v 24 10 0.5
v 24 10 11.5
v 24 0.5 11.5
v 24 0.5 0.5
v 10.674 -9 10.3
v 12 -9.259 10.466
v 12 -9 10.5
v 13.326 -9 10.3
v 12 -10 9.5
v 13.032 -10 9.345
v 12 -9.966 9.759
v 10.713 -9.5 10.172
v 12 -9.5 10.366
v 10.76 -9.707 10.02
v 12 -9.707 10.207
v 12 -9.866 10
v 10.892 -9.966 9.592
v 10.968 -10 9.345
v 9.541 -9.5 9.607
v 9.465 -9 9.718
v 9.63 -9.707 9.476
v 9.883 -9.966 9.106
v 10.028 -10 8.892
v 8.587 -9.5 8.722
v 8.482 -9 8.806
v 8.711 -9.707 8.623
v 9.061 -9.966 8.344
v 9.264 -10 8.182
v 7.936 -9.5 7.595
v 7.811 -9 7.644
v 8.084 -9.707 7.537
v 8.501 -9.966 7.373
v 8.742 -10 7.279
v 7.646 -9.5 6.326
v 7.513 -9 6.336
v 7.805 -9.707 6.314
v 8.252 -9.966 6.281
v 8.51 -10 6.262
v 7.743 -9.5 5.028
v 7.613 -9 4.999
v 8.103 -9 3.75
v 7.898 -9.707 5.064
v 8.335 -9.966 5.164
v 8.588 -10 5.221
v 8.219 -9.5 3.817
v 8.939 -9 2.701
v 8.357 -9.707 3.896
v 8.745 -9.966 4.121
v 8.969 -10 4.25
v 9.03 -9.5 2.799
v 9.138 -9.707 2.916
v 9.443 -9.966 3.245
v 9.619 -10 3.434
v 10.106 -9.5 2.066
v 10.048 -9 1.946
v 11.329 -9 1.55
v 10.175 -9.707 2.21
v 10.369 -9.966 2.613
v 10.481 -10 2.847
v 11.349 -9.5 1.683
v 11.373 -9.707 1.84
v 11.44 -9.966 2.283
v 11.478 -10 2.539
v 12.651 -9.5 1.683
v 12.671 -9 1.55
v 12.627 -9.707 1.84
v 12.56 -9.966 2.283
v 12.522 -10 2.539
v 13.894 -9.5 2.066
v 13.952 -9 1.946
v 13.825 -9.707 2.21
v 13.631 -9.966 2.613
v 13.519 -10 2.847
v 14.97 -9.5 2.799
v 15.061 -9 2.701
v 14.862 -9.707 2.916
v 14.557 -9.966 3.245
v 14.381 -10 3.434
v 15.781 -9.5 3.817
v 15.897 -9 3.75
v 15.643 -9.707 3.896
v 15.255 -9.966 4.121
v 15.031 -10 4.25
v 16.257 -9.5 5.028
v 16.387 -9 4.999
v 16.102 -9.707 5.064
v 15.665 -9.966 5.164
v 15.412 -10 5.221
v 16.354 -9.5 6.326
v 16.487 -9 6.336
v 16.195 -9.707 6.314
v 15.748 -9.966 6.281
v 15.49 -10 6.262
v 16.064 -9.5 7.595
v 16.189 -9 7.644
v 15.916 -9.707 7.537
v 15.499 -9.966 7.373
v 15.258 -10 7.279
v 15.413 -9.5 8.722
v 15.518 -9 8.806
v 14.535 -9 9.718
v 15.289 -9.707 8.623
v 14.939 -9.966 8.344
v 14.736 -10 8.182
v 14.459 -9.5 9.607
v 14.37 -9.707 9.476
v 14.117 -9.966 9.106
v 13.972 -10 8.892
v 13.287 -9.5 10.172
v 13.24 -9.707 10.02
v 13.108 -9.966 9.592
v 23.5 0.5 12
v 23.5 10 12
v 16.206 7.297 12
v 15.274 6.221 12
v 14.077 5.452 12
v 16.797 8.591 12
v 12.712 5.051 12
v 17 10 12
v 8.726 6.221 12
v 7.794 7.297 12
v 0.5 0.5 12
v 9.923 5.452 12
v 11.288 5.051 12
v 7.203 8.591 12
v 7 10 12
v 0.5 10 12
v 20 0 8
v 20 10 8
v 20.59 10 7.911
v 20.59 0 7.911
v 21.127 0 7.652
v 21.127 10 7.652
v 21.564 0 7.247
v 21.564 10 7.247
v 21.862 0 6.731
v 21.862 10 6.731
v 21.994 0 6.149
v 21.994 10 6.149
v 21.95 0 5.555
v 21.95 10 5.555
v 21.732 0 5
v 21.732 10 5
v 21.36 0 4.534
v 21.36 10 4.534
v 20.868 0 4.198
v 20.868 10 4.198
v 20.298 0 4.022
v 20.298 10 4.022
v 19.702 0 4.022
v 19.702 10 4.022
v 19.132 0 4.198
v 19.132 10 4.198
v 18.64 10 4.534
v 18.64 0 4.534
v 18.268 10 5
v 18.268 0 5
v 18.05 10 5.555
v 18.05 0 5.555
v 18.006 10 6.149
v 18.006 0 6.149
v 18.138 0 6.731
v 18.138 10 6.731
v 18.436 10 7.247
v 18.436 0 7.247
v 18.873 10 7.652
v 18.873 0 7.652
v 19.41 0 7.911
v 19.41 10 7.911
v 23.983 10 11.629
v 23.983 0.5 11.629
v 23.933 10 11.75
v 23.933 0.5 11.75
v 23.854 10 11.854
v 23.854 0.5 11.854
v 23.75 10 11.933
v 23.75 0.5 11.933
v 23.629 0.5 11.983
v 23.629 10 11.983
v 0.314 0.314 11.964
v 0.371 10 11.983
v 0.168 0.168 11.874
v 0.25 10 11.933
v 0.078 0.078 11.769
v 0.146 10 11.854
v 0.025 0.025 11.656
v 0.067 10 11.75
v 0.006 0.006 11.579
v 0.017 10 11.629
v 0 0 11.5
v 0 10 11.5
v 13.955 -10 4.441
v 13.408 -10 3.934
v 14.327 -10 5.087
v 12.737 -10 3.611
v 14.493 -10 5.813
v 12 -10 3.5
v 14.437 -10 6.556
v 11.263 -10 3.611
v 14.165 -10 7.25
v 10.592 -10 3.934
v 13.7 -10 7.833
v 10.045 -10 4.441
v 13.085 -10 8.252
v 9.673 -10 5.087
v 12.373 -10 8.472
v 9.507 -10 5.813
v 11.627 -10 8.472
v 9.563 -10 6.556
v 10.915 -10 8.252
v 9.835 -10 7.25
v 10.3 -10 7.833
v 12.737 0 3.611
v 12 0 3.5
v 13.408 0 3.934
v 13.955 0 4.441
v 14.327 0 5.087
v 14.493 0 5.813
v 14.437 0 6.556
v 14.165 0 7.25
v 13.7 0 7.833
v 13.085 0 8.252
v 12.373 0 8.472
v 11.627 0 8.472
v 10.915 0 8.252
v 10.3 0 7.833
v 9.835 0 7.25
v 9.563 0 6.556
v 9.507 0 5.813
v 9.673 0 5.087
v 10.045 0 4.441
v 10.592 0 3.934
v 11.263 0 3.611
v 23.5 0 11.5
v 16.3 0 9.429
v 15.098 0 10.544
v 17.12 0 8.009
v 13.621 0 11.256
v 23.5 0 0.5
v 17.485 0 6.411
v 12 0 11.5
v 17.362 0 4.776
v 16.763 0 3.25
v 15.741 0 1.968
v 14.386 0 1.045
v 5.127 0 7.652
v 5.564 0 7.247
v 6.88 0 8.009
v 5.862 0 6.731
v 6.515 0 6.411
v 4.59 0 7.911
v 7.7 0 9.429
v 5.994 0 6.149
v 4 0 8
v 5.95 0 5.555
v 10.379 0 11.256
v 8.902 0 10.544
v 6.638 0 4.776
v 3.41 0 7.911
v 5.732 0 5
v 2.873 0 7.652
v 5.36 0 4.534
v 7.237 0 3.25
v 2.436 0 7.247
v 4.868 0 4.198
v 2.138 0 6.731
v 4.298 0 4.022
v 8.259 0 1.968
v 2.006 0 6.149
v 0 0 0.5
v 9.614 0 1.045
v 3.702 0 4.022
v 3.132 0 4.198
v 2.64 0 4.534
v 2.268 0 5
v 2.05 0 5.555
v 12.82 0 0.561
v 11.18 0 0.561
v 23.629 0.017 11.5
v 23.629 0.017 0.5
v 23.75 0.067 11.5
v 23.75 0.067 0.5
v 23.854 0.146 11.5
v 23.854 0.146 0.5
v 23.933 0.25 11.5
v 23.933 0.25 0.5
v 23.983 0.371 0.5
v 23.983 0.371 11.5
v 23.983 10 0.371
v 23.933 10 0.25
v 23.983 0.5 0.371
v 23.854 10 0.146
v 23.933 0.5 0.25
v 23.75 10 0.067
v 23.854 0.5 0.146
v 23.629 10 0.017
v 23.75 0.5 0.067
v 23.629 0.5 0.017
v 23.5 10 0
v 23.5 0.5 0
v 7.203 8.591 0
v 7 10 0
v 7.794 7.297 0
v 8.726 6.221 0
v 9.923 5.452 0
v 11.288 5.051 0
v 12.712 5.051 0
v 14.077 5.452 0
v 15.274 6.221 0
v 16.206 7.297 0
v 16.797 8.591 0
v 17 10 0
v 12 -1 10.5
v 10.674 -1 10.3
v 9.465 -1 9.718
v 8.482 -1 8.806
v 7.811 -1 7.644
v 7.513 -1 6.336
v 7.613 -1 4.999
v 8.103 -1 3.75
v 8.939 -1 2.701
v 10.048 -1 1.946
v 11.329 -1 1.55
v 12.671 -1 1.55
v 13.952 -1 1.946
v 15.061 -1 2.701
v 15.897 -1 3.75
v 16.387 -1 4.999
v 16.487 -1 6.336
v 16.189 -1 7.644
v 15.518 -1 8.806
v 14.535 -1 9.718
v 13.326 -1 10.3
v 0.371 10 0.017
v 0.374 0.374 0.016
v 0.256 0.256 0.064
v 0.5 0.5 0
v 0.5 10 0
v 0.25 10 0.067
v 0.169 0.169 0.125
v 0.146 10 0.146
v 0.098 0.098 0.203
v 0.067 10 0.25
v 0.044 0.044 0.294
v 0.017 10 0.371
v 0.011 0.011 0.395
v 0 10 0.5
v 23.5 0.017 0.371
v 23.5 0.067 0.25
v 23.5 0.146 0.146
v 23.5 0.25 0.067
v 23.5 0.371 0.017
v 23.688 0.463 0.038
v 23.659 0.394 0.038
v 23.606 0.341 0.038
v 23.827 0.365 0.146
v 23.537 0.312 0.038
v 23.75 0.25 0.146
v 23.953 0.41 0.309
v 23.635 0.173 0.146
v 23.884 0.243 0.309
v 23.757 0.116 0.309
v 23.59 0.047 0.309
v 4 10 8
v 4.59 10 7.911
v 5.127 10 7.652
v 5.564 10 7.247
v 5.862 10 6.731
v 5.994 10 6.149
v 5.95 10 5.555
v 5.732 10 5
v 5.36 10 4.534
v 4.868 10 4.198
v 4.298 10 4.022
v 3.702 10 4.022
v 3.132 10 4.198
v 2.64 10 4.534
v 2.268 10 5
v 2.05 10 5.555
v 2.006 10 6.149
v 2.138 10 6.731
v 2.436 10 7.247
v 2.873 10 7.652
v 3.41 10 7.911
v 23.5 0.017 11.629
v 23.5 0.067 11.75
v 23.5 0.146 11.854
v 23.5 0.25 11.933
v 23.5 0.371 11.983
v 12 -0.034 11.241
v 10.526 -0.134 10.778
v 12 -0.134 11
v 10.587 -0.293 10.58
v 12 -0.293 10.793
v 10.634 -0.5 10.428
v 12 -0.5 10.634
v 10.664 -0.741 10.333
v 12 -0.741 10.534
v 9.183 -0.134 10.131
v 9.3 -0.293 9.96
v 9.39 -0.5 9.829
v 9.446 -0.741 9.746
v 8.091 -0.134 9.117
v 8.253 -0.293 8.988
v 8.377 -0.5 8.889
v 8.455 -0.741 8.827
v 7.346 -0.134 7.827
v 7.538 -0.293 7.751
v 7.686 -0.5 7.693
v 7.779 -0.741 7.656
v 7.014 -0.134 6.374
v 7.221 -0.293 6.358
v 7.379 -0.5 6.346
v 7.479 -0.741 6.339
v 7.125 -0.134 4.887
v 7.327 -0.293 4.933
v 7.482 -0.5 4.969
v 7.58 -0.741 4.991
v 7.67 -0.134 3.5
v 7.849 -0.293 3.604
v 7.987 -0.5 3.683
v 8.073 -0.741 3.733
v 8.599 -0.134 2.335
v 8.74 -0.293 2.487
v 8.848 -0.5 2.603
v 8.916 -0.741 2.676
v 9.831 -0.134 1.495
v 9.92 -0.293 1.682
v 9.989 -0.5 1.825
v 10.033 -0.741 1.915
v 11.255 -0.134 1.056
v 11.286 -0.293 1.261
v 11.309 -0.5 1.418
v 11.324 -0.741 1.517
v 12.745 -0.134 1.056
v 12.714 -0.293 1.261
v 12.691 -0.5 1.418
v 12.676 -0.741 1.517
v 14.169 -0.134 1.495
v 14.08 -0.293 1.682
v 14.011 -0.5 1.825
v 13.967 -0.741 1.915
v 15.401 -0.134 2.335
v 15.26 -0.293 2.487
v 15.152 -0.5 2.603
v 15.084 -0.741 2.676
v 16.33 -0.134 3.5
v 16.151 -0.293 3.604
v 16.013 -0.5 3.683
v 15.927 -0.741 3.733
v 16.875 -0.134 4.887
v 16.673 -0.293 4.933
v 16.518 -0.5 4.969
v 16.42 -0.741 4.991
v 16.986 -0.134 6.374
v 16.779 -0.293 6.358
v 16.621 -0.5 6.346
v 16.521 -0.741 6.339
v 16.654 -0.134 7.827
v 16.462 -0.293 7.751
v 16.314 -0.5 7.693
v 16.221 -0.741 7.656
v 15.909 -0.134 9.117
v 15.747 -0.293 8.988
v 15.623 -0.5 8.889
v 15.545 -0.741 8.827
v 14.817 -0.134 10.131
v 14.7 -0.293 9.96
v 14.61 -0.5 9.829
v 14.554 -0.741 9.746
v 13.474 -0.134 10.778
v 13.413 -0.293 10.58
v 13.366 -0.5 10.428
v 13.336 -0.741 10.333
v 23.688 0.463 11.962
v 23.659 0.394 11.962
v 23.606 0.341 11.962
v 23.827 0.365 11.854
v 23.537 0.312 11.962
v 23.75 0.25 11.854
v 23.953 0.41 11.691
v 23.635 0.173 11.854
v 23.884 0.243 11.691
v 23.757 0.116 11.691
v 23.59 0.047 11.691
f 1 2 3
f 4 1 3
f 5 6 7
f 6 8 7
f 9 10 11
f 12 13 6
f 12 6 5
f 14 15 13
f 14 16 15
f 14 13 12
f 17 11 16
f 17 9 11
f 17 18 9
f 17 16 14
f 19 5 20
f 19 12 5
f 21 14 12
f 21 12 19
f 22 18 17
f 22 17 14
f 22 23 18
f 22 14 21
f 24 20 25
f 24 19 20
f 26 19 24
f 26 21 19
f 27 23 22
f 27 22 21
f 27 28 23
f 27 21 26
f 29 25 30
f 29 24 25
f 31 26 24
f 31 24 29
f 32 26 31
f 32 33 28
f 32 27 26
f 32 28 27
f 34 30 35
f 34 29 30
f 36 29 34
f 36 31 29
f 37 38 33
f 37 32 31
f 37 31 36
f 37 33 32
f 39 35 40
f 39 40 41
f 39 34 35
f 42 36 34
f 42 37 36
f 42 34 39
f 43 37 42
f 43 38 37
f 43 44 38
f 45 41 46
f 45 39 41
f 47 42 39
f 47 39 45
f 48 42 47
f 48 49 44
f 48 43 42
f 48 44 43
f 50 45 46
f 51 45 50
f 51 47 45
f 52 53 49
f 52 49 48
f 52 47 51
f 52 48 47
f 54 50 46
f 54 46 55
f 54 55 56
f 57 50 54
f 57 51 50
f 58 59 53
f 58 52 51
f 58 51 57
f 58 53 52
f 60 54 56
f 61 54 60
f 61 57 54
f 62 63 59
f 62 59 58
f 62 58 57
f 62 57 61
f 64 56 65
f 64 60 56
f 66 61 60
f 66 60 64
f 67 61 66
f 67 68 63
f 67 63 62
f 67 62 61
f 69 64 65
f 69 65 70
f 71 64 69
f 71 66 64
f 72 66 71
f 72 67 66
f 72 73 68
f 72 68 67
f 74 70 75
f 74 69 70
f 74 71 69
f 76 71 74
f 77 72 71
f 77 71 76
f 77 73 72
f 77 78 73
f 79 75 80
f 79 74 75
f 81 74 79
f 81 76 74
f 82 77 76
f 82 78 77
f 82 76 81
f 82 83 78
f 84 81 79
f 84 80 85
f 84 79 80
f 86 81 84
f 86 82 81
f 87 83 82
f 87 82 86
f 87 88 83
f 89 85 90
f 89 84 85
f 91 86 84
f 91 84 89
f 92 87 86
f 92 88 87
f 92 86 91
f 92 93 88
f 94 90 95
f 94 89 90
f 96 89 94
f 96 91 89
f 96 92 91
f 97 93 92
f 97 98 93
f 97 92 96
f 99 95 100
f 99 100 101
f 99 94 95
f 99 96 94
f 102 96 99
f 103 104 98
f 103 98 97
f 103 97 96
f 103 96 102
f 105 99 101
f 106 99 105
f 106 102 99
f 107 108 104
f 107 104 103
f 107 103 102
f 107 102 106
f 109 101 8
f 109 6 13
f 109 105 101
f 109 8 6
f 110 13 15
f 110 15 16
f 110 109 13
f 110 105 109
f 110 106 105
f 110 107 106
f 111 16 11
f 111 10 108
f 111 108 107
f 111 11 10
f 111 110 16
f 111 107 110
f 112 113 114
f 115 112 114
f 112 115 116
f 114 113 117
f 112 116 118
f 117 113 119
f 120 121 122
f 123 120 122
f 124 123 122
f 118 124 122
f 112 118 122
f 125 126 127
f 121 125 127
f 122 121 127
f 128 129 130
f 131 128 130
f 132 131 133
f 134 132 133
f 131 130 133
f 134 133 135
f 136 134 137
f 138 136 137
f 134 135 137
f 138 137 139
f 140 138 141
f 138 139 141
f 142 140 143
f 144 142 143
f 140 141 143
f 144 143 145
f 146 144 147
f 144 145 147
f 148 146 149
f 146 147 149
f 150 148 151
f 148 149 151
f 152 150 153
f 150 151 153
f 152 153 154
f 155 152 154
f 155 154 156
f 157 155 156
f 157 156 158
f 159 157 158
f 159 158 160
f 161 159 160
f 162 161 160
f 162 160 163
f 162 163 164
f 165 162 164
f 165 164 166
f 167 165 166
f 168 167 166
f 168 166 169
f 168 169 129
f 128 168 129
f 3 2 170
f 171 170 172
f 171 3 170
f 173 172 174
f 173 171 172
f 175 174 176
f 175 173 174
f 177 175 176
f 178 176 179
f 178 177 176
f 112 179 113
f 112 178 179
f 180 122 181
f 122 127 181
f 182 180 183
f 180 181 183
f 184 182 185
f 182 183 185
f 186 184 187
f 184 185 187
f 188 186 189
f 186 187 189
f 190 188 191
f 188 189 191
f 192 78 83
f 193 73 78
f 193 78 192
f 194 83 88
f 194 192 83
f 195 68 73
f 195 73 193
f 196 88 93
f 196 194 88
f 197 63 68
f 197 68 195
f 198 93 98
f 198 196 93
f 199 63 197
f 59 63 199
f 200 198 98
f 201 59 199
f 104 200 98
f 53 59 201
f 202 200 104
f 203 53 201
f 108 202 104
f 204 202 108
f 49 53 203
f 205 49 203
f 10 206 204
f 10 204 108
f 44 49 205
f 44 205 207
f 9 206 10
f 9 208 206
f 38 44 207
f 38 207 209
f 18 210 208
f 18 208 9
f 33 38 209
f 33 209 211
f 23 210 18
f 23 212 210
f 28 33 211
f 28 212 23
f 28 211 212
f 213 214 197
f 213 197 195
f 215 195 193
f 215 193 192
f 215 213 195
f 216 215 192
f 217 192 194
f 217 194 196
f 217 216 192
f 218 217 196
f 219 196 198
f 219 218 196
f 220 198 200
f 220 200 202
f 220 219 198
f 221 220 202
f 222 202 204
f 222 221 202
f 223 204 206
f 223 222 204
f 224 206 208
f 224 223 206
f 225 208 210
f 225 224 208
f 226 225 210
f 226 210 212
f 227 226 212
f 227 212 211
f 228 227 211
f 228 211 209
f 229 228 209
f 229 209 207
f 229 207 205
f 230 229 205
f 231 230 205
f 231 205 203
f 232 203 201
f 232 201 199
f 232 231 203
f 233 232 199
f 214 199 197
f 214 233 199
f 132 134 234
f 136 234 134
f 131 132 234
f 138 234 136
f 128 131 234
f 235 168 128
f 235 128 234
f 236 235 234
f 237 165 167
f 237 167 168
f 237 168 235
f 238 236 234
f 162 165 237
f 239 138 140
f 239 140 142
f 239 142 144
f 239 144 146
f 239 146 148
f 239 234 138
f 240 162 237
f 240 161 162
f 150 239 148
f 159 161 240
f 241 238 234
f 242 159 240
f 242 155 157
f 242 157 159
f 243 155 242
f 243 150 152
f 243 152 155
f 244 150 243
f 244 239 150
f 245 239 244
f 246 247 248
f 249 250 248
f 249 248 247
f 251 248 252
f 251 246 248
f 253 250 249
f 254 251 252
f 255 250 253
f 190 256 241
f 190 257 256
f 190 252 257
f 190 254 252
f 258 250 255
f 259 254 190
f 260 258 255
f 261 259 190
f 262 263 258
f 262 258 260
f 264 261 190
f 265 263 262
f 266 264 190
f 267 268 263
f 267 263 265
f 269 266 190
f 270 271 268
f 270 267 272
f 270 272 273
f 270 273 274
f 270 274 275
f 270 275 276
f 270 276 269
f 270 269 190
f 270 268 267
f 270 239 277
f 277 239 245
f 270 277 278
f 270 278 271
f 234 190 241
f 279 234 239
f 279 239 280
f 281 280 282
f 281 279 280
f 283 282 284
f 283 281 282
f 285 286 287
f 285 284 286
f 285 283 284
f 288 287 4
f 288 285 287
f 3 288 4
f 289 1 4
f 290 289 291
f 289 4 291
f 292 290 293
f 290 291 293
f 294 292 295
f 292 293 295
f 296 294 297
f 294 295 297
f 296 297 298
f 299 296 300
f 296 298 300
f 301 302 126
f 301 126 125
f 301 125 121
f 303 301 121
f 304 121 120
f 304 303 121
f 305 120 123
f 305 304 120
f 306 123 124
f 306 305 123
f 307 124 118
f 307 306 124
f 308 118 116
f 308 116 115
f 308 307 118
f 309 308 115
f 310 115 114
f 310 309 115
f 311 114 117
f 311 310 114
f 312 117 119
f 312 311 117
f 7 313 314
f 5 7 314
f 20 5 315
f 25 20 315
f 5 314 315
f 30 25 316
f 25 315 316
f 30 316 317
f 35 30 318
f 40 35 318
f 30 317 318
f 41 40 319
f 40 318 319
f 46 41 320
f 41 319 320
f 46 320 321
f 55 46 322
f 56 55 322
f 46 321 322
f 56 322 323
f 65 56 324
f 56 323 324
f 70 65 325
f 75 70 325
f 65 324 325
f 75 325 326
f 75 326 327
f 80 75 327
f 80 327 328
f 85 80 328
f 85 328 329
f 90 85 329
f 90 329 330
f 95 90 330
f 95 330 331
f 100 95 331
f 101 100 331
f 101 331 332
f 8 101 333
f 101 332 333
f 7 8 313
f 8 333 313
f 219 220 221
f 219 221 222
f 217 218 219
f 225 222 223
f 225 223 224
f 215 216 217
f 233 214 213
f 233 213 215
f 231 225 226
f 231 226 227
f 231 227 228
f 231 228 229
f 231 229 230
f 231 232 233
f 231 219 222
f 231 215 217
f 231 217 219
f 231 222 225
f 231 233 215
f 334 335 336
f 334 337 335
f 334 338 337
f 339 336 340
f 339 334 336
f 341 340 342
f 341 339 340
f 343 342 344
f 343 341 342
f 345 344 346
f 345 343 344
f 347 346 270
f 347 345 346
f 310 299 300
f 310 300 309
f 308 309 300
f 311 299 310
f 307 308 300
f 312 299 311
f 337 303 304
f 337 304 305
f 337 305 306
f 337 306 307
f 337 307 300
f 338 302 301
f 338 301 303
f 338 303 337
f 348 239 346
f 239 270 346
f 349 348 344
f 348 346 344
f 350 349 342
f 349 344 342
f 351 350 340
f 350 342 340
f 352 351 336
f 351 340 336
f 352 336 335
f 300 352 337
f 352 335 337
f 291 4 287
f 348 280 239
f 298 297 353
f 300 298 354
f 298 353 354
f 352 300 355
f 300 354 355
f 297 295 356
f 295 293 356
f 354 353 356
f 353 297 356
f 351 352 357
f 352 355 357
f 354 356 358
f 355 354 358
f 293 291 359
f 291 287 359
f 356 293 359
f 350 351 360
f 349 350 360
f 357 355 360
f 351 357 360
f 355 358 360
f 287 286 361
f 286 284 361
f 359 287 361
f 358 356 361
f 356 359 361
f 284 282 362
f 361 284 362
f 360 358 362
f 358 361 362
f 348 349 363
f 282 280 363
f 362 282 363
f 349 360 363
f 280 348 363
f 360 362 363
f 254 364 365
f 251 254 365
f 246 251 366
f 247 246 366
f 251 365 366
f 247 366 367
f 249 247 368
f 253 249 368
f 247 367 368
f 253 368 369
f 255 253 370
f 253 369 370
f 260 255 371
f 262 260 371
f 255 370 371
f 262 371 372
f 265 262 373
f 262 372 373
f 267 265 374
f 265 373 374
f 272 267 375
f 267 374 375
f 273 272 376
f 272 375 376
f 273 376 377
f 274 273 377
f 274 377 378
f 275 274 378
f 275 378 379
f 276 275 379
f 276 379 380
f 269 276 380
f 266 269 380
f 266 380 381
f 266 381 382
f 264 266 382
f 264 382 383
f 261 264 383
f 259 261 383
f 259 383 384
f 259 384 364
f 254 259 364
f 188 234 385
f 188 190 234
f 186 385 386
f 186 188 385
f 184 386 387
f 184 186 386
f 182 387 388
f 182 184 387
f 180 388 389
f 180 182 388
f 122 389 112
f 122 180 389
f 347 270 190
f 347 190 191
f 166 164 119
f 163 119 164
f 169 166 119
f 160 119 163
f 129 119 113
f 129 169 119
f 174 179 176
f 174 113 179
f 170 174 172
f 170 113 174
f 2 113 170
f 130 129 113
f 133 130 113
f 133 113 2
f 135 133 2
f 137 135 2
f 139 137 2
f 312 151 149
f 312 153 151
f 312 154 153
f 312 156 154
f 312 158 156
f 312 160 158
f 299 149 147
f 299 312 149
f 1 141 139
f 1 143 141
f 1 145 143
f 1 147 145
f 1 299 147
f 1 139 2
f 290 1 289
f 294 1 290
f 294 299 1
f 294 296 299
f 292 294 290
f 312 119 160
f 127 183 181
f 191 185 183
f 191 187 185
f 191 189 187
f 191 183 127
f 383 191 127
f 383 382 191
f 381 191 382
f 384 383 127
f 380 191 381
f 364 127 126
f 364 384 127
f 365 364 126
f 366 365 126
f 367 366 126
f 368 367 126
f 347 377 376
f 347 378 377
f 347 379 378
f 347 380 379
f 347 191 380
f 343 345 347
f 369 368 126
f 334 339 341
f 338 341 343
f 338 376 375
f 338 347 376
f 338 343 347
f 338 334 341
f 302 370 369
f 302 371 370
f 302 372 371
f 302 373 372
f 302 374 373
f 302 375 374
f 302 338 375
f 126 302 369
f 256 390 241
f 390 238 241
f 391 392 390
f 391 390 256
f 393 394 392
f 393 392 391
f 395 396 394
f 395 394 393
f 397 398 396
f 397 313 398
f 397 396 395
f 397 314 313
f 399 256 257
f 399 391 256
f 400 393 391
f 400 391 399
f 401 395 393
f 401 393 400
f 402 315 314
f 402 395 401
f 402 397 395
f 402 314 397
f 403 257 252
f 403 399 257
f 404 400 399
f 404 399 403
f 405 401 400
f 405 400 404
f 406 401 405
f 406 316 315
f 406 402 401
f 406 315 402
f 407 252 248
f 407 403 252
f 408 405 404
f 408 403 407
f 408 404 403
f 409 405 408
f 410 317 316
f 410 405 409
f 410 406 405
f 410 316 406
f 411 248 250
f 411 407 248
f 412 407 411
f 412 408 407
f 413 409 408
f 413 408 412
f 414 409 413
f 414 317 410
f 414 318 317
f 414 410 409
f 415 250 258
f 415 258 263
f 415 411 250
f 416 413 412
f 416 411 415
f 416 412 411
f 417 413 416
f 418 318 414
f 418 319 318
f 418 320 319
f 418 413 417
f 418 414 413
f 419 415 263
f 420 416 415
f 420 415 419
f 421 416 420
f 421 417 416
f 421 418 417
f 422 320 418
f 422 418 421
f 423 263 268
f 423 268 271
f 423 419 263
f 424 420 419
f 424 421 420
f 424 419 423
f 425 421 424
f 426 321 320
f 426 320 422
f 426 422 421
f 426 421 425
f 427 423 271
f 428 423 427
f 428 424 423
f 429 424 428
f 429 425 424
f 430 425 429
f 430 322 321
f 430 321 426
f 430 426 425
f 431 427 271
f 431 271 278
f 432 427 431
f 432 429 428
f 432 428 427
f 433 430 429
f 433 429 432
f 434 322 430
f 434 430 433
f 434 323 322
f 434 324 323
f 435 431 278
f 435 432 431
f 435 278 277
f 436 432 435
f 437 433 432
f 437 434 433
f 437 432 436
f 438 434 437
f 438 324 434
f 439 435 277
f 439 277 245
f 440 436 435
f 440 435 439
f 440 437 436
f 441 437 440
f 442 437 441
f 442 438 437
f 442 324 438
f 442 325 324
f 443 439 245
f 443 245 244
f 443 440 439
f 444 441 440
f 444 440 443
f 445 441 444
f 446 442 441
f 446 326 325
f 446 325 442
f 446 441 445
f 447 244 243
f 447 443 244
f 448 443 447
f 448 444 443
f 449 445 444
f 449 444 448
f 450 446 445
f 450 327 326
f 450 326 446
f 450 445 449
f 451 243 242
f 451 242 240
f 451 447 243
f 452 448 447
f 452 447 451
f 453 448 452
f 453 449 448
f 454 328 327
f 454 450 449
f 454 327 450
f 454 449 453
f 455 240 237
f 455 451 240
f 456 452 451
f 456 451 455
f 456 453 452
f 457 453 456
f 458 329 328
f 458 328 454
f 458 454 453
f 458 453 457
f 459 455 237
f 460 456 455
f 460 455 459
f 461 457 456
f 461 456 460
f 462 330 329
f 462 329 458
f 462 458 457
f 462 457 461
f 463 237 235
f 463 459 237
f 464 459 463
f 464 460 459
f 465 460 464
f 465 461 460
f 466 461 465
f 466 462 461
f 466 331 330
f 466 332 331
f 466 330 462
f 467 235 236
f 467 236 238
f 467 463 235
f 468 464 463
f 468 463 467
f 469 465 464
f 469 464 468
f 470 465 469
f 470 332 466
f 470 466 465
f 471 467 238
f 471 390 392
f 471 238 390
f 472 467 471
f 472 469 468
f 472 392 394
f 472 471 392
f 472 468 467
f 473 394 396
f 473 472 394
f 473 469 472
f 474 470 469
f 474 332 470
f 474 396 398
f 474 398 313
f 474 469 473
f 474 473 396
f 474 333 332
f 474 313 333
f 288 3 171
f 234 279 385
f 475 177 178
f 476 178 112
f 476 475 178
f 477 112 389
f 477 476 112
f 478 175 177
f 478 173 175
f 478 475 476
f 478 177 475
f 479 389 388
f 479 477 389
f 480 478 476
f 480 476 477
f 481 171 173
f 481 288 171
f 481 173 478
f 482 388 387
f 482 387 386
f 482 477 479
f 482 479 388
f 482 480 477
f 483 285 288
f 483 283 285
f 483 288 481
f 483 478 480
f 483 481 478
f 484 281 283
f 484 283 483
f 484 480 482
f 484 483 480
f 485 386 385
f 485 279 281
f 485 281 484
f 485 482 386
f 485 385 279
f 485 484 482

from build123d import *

# Parameters (mm, degrees)
BOSS_EXTRUDE1_DEPTH = 12
SKETCH2_R           = 2
CUT_EXTRUDE1_DEPTH  = 29.635642127
SKETCH3_R           = 4.5
SKETCH3_R_2         = 2.5
BOSS_EXTRUDE2_DEPTH = 10
FILLET1_R           = 1
FILLET2_R           = 0.5


with BuildPart() as part:
    # Sketch1 → Boss-Extrude1 (new body)
    with BuildSketch(Plane.XY):
        with BuildLine():
            Line((17, 10), (24, 10))
            Line((24, 10), (24, 0))
            Line((24, 0), (0, 0))
            Line((0, 0), (0, 10))
            Line((0, 10), (7, 10))
            ThreePointArc((7, 10), (12, 5), (17, 10))
        make_face()
    extrude(amount=BOSS_EXTRUDE1_DEPTH)

    # Sketch2 → Cut-Extrude1 (cut, through all)
    with BuildSketch(Plane(origin=(0, 10, 0), x_dir=(1, 0, 0), z_dir=(0, 1, 0))):
        with Locations(Location((4, -6, 0), (0, 0, 270))):
            Circle(SKETCH2_R)
        with Locations(Location((20, -6, 0), (0, 0, 270))):
            Circle(SKETCH2_R)
    extrude(amount=-CUT_EXTRUDE1_DEPTH, mode=Mode.SUBTRACT)

    # Sketch3 → Boss-Extrude2 (add)
    with BuildSketch(Plane.XZ):
        with Locations(Location((12, 6, 0), (0, 0, 90))):
            Circle(SKETCH3_R)
        with Locations(Location((12, 6, 0), (0, 0, 270))):
            Circle(SKETCH3_R_2, mode=Mode.SUBTRACT)
    extrude(amount=BOSS_EXTRUDE2_DEPTH)

    # Fillet1
    fillet1_edges = [part.edges().sort_by_distance(p)[0] for p in [
        (12, 0, 1.5),
        (12, -10, 1.5),
    ]]
    fillet(fillet1_edges, radius=FILLET1_R)

    # Fillet2
    fillet2_edges = [part.edges().sort_by_distance(p)[0] for p in [
        (24, 0, 6),
        (24, 5, 12),
        (0, 5, 12),
        (24, 5, 0),
        (12, 0, 0),
        (0, 5, 0),
        (12, 0, 12),
    ]]
    fillet(fillet2_edges, radius=FILLET2_R - 0.0001)  # a hair under: the kernel refuses the full size


solid = part.part
